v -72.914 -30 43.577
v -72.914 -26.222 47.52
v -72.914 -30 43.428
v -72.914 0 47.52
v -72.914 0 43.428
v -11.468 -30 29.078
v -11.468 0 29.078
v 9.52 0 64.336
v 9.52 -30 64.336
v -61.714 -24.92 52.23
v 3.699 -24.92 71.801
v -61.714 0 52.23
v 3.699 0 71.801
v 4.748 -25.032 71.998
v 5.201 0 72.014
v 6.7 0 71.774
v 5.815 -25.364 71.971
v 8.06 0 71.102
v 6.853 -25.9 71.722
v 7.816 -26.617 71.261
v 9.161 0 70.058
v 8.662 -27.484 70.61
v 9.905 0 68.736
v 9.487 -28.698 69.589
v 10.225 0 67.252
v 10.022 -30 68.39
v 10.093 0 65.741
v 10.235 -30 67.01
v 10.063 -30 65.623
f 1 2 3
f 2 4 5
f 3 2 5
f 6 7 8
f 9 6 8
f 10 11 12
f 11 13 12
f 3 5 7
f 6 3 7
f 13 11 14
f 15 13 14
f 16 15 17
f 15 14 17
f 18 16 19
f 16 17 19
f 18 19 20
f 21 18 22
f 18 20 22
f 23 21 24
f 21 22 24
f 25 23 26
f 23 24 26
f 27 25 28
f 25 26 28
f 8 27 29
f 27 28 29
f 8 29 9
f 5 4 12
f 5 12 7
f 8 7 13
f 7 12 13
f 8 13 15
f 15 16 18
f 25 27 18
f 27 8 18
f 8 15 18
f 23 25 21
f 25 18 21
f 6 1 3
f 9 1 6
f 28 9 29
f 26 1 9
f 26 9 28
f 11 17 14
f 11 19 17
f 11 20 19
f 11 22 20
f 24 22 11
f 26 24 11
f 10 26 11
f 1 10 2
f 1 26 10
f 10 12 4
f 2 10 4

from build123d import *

# Parameters (mm, degrees)
F1_DEPTH = 30
F2_SIZE  = 5.08
F3_R     = 5.08


with BuildPart() as f1:
    # F0 (on Front) → F1 (new body)
    with BuildSketch(Plane.XZ):
        Polygon((-72.913893, 47.520347), (-72.913893, 43.428164), (-11.468264, 29.078148), (16.188771, 75.537905), (-61.714064, 52.23044), align=None)
    extrude(amount=F1_DEPTH)

    # F2
    f2_edges = [f1.edges().sort_by_distance(p)[0] for p in [
        (-22.762647, -30, 63.884173),
    ]]
    chamfer(f2_edges, length=F2_SIZE)

    # F3
    f3_edges = [f1.edges().sort_by_distance(p)[0] for p in [
        (16.188771, -12.46, 75.537905),
    ]]
    fillet(f3_edges, radius=F3_R)


solid = f1.part
